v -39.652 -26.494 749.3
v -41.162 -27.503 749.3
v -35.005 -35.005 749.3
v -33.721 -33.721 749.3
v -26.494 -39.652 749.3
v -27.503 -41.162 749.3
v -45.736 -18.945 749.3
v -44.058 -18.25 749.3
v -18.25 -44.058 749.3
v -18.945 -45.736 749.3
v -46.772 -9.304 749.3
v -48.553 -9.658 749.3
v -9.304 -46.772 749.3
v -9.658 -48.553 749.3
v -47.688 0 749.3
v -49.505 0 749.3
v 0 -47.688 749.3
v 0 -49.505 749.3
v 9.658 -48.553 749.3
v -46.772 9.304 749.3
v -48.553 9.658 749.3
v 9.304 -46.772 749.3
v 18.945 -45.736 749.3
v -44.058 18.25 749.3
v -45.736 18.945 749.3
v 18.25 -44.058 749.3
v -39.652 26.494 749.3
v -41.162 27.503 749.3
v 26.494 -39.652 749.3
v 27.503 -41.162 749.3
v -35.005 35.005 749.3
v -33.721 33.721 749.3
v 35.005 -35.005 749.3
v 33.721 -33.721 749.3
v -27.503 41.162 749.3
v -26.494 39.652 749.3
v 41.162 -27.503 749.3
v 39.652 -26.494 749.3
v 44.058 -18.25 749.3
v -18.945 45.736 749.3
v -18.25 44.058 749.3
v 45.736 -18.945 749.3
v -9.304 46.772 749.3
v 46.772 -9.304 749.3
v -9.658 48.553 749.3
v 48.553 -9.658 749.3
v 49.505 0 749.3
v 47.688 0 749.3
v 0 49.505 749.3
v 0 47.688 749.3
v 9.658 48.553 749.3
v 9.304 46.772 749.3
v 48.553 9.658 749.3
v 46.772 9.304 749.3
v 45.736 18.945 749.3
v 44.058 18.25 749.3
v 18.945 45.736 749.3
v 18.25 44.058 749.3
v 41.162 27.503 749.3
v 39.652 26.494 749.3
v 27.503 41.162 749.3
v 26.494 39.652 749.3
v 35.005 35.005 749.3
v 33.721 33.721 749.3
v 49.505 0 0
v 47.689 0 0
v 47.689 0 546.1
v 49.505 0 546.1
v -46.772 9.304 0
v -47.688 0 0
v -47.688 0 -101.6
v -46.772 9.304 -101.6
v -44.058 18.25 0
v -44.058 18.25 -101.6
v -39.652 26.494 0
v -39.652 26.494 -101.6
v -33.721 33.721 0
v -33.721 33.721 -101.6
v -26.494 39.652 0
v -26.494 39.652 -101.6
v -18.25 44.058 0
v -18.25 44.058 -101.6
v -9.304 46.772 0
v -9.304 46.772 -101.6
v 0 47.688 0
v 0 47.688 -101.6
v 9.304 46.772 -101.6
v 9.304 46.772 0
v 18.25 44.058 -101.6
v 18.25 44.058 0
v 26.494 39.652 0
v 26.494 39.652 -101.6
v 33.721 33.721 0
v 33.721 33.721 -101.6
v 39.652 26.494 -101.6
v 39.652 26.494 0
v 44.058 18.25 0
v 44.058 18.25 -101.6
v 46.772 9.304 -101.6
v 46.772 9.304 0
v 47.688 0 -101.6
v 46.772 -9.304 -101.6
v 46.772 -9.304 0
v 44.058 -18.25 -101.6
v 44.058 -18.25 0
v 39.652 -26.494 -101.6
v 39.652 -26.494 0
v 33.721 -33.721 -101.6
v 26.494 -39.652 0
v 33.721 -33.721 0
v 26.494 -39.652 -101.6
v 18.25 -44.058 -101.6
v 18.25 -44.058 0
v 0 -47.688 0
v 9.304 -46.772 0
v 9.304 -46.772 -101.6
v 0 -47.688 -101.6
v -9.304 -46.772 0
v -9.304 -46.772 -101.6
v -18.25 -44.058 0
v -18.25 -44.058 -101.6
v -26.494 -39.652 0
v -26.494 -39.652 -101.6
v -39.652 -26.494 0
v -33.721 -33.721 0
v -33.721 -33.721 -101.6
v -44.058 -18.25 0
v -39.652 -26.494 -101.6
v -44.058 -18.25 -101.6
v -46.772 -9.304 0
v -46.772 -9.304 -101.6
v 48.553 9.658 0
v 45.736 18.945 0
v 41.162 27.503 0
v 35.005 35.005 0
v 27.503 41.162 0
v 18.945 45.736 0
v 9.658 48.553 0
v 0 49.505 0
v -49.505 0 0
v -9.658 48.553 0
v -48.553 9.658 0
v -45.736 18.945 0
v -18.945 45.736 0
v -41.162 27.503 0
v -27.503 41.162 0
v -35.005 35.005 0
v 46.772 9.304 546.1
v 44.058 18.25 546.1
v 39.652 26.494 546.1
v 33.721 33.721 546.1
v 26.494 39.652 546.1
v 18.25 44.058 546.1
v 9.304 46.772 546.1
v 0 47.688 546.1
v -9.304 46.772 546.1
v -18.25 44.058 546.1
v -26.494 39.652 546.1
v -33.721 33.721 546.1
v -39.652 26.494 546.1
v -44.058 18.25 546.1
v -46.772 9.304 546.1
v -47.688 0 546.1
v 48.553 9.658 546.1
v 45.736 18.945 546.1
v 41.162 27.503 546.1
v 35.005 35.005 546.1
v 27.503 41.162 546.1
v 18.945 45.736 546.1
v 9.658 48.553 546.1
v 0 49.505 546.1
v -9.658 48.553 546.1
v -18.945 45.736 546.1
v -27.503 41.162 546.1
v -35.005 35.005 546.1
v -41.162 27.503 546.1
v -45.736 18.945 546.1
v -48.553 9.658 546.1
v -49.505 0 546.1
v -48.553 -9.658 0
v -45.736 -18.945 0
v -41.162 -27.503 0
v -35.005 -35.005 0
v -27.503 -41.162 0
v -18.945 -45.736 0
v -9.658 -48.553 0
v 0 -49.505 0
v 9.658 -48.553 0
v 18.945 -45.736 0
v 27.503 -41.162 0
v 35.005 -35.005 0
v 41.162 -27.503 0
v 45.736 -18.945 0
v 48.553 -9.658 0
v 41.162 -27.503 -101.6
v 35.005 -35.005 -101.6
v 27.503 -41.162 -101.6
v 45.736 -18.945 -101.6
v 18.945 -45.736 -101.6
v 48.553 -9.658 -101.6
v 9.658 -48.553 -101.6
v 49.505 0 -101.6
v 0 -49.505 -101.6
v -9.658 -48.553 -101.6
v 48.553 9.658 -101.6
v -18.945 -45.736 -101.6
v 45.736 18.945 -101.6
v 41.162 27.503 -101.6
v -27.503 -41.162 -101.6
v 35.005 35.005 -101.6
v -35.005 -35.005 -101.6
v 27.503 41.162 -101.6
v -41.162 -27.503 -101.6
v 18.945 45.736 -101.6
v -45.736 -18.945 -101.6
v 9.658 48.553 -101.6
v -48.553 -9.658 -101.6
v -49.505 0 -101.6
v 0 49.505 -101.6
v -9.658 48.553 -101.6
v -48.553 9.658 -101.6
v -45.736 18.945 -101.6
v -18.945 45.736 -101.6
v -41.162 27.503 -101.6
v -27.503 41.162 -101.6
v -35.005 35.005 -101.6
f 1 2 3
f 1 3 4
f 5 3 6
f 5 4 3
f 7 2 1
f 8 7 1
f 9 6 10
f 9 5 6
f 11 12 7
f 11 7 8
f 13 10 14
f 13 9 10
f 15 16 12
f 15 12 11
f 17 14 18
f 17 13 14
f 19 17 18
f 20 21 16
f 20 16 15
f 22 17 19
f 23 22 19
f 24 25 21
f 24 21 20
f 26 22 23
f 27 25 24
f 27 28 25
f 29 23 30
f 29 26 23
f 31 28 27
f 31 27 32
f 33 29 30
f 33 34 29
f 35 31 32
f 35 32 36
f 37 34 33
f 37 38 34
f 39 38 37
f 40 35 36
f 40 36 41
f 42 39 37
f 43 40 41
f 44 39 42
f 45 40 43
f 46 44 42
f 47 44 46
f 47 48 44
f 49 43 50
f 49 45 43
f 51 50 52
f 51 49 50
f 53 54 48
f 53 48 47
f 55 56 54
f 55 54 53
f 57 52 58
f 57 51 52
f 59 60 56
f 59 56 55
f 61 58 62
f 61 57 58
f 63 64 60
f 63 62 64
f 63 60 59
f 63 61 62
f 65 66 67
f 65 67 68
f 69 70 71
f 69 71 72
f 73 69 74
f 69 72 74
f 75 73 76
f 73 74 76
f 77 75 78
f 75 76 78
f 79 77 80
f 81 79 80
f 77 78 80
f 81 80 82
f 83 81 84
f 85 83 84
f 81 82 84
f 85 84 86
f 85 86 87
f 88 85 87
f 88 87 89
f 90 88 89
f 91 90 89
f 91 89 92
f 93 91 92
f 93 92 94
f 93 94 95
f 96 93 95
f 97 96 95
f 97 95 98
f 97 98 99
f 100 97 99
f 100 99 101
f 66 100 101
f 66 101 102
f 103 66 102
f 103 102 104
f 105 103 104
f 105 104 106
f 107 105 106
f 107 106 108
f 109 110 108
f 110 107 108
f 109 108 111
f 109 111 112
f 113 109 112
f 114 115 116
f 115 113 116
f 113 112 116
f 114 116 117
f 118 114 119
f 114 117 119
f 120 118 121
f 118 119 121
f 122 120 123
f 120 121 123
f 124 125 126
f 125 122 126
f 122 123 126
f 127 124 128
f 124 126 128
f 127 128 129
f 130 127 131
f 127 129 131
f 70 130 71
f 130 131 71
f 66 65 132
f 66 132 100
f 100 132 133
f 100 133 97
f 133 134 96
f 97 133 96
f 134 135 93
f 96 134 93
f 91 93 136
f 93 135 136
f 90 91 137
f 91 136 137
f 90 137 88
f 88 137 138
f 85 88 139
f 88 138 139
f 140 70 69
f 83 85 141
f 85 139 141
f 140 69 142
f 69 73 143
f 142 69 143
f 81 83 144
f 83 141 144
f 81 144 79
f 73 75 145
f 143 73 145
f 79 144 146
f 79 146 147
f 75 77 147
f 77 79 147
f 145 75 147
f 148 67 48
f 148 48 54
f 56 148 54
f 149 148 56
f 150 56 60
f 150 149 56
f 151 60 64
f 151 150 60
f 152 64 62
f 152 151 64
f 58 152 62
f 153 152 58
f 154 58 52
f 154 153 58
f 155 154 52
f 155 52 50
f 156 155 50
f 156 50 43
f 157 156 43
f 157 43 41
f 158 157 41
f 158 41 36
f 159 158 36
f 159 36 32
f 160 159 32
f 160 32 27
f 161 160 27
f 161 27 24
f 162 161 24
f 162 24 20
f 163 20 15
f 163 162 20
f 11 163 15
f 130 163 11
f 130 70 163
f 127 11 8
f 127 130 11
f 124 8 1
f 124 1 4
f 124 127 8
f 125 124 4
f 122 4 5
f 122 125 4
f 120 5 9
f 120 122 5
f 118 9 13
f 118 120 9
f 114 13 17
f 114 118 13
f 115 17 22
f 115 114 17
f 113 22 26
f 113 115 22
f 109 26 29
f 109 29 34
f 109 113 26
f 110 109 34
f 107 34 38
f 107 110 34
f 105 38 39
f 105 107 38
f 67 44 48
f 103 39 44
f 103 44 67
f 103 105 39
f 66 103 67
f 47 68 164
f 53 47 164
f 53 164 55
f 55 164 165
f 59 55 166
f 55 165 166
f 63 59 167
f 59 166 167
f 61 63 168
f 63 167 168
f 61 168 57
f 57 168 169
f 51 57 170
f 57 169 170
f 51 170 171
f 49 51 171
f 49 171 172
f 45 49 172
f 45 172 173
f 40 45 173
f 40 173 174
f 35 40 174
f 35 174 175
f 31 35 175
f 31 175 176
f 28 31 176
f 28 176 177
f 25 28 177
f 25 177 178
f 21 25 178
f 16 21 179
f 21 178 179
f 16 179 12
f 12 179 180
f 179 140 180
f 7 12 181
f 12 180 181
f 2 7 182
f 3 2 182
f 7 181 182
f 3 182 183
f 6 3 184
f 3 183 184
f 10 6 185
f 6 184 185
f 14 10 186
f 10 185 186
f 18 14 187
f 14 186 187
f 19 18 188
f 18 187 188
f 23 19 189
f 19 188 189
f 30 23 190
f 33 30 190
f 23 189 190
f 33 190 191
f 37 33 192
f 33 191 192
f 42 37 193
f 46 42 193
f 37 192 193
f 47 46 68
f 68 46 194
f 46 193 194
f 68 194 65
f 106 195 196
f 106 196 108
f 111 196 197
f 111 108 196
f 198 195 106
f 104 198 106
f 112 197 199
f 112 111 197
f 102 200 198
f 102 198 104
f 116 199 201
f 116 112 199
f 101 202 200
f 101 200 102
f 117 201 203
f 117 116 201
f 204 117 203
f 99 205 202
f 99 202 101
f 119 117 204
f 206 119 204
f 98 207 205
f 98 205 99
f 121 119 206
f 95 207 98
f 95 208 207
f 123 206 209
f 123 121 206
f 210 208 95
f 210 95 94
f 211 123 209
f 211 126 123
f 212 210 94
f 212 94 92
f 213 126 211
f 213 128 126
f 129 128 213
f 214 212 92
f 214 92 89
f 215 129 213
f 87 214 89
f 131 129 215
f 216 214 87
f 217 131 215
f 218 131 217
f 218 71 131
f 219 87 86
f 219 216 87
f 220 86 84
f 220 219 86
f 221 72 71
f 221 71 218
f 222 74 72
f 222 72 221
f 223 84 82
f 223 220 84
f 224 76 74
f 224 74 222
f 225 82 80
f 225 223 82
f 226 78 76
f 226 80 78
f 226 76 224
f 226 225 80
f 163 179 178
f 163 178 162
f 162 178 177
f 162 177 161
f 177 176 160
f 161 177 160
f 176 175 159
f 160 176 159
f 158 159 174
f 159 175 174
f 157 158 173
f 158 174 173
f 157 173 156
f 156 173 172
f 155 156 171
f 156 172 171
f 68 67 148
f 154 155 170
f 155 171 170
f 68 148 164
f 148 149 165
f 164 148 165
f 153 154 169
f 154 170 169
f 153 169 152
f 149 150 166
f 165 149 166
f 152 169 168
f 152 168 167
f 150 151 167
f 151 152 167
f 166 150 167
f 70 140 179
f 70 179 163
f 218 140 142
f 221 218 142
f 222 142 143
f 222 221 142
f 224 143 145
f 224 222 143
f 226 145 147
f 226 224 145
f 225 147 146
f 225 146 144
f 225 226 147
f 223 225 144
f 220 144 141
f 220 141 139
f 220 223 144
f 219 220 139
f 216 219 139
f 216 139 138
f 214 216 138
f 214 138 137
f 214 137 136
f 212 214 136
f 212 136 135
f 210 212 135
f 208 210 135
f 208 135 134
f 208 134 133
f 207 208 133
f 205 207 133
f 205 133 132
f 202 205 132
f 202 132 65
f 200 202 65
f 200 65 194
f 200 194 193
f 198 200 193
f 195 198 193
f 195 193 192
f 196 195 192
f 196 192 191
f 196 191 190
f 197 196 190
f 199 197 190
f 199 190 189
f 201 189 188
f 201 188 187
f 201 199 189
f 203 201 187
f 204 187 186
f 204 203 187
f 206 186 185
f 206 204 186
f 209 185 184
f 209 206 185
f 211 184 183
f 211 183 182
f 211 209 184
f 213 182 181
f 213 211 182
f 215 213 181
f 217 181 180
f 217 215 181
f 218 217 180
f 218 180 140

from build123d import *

# Parameters (mm, degrees)
BOSS_EXTRUDE1_DEPTH = 546.1
SKETCH2_R           = 49.5046
SKETCH2_R_2         = 47.6885
BOSS_EXTRUDE2_DEPTH = 203.2
BOSS_EXTRUDE3_START = 101.6
SKETCH3_R           = 49.5046
SKETCH3_R_2         = 47.6885
BOSS_EXTRUDE3_DEPTH = 101.6


with BuildPart() as part:
    # Sketch1 → Boss-Extrude1 (new body)
    with BuildSketch(Plane.XY):
        with BuildLine():
            Line((-49.5046, 0), (-47.6885, 0))
            ThreePointArc((-47.6885, 0), (0, -47.6885), (47.6885, 0))
            Line((47.6885, 0), (49.5046, 0))
            ThreePointArc((49.5046, 0), (0, -49.5046), (-49.5046, 0))
        make_face()
    extrude(amount=BOSS_EXTRUDE1_DEPTH)

    # Sketch2 → Boss-Extrude2 (add)
    with BuildSketch(Plane.XY.offset(546.1)):
        Circle(SKETCH2_R)
        Circle(SKETCH2_R_2, mode=Mode.SUBTRACT)
    extrude(amount=BOSS_EXTRUDE2_DEPTH)

    # Sketch3 → Boss-Extrude3 (add)
    with BuildSketch(Plane(origin=(0, 0, 0), x_dir=(-1, 0, 0), z_dir=(0, 0, -1)).offset(BOSS_EXTRUDE3_START)):
        Circle(SKETCH3_R)
        Circle(SKETCH3_R_2, mode=Mode.SUBTRACT)
    extrude(amount=-BOSS_EXTRUDE3_DEPTH)


solid = part.part
